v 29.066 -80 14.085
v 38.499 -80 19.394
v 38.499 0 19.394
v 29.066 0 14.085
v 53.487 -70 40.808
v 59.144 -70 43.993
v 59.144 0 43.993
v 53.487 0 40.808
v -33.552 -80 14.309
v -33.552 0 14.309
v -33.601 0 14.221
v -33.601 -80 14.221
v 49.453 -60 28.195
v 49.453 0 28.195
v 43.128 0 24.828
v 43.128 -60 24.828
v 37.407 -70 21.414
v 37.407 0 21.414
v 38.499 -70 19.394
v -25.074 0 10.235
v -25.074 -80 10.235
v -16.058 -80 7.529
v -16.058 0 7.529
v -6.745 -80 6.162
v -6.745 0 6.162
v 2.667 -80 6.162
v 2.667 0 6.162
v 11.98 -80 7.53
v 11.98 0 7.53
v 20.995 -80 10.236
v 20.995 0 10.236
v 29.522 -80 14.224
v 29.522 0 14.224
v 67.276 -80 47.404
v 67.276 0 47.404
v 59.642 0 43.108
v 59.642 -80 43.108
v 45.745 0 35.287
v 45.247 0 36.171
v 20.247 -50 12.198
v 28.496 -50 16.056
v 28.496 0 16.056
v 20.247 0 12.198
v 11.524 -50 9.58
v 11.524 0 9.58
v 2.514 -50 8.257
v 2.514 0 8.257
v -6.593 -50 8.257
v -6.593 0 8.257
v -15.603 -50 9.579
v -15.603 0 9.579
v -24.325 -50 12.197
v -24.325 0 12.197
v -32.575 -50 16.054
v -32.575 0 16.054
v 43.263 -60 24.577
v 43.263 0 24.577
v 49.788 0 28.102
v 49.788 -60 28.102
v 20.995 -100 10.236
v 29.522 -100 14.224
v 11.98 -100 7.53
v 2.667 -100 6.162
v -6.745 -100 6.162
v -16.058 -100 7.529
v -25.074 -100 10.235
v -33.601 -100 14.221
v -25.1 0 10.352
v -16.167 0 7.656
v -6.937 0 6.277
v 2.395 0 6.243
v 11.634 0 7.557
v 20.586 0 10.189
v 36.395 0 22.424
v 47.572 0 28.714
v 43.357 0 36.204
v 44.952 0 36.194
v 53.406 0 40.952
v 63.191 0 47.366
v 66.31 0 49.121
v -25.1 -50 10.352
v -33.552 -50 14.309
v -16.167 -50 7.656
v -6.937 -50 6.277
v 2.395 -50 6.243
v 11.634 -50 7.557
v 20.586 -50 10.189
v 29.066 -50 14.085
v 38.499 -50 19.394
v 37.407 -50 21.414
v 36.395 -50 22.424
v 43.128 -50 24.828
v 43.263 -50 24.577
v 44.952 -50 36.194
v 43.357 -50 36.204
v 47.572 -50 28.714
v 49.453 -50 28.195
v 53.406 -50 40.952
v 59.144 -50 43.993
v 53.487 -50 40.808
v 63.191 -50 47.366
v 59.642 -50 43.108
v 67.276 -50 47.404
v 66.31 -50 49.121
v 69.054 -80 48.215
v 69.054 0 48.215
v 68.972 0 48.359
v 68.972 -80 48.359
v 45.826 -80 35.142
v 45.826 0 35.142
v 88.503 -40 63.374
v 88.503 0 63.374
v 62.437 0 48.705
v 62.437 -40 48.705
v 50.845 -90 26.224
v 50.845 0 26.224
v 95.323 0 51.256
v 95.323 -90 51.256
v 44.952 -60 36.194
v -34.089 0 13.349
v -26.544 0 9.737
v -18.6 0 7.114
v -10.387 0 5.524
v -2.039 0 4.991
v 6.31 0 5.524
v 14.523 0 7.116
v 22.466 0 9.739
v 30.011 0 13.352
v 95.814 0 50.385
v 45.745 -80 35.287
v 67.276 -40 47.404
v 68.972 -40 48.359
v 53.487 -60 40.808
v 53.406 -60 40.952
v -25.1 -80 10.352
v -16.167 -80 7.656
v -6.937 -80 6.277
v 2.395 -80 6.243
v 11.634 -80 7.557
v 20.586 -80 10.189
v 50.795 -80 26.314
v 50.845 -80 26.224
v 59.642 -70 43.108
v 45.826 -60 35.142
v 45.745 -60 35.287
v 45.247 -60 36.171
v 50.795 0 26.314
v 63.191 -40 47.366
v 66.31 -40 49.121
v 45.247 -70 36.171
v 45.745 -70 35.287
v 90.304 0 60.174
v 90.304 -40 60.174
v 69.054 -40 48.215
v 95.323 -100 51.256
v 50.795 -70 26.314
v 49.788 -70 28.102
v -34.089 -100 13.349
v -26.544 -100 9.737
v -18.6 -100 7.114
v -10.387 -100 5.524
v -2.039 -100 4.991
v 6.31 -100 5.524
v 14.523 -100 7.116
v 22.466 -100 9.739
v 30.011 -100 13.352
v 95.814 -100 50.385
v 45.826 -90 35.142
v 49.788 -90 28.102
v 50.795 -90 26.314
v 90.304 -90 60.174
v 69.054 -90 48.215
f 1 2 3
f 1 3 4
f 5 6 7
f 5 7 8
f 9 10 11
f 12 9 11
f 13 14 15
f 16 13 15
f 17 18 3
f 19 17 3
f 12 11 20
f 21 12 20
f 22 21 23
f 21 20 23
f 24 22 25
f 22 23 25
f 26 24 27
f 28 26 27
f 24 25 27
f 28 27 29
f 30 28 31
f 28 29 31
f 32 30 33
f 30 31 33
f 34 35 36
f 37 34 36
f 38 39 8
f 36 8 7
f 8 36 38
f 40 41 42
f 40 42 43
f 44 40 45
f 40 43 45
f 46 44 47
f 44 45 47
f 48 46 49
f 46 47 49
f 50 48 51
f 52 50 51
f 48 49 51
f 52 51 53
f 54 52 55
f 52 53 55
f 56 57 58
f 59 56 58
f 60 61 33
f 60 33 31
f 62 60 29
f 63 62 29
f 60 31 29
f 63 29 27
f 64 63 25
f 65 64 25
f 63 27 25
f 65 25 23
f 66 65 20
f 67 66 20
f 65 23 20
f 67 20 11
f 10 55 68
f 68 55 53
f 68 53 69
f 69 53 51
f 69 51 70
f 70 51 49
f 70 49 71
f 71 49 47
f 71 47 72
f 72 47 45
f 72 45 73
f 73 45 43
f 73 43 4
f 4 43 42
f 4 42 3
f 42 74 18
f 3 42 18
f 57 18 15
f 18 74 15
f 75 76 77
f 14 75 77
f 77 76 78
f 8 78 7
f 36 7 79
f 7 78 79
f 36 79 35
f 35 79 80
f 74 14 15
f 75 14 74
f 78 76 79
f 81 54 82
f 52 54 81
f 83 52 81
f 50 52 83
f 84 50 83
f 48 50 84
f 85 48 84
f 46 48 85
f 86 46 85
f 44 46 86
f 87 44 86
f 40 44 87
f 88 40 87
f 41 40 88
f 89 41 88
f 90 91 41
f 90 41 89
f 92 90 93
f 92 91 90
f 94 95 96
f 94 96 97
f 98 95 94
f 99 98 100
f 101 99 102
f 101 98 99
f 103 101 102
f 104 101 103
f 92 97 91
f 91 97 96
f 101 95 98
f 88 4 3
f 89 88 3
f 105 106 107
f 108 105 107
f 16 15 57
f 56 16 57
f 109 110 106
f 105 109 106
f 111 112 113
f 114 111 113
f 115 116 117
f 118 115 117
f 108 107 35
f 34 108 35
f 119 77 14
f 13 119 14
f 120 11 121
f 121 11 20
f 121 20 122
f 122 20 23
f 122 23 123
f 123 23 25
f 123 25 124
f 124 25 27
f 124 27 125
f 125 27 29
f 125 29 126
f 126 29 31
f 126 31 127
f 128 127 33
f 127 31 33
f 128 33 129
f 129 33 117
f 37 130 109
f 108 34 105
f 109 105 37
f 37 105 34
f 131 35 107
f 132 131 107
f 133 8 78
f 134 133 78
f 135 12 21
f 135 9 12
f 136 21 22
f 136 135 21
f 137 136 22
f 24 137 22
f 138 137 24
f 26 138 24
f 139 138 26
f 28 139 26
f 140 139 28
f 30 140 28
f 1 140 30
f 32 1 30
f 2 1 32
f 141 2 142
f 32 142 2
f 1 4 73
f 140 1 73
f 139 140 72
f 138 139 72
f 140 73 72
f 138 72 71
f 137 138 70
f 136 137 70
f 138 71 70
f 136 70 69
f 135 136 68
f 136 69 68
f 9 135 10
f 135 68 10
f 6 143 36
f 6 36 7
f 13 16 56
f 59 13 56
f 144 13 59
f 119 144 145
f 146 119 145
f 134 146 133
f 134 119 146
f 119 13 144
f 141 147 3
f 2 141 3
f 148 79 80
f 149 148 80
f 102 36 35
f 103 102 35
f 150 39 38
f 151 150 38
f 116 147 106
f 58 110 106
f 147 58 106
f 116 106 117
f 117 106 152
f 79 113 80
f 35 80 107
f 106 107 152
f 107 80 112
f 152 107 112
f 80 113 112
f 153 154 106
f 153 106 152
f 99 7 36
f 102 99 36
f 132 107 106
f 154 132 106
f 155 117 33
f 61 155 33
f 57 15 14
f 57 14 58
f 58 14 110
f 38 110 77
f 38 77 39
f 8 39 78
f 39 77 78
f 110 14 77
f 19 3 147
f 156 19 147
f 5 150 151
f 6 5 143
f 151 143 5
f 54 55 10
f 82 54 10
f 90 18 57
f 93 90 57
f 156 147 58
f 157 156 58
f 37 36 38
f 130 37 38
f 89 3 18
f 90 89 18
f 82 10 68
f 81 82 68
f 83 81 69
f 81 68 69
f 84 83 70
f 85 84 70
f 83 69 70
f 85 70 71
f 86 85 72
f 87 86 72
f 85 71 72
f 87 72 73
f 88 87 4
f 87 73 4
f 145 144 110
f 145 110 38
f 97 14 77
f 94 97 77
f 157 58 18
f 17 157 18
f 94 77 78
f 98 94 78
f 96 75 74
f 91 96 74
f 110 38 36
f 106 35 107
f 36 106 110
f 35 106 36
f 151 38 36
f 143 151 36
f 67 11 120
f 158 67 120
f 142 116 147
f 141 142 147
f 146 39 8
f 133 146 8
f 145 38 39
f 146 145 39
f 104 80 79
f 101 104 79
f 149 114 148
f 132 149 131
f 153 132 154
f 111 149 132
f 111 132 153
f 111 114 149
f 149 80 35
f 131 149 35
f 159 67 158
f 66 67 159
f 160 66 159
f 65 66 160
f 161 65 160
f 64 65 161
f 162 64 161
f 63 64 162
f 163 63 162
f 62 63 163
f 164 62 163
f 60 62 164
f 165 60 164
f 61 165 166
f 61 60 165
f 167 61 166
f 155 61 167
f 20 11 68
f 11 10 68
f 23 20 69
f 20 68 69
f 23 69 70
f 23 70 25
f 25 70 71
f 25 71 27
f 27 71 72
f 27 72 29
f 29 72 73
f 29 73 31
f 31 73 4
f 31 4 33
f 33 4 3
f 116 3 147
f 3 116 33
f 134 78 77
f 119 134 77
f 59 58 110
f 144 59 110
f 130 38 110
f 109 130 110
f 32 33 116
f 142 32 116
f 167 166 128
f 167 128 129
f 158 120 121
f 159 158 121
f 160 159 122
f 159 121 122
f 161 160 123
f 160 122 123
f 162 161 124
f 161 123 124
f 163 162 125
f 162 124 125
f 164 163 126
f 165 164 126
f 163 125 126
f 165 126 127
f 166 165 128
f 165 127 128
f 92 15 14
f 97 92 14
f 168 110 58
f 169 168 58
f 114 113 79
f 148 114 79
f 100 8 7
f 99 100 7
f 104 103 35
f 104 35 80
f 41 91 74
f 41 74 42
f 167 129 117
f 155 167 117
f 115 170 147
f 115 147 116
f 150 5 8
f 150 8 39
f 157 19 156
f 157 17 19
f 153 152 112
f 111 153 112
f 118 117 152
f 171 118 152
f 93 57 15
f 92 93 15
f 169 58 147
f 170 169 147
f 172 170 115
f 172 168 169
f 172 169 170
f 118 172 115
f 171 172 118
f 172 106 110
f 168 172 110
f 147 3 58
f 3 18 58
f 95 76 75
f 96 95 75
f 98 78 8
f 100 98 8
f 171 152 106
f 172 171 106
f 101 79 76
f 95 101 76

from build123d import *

# Parameters (mm, degrees)
F1_DEPTH = 100
F2_DEPTH = 90
F3_DEPTH = 80
F4_DEPTH = 80
F5_DEPTH = 70
F6_DEPTH = 60
F7_DEPTH = 50
F8_DEPTH = 40


with BuildPart() as f1:
    # F0 (on Front) → F1 (new body)
    with BuildSketch(Plane.XZ):
        with BuildLine():
            Line((50.8452397293, 26.2241268437), (29.5219979318, 14.223603626))
            ThreePointArc((29.5219979318, 14.223603626), (-2.0391196005, 5.9907088835), (-33.6008071966, 14.221417955))
            Line((-33.6008071966, 14.221417955), (-34.0891893351, 13.3487880868))
            ThreePointArc((-34.0891893351, 13.3487880868), (-2.0385061949, 4.9907089067), (30.0114505771, 13.3515729915))
            Line((30.0114505771, 13.3515729915), (95.813926037, 50.3845974272))
            Line((95.813926037, 50.3845974272), (95.3234723322, 51.2560646748))
            Line((95.3234723322, 51.2560646748), (50.8452397293, 26.2241268437))
        make_face()
    extrude(amount=F1_DEPTH)


with BuildPart() as f2:
    # F0 (on Front) → F2 (new body)
    with BuildSketch(Plane.XZ):
        Polygon((50.7948435843, 26.3136737049), (50.8452397293, 26.2241268437), (95.3234723322, 51.2560646748), (90.3044164077, 60.1742210862), (69.0536898036, 48.2145087485), (45.8261838048, 35.1422832552), (49.7882909537, 28.1021761505), align=None)
    extrude(amount=F2_DEPTH)


with BuildPart() as f3:
    # F0 (on Front) → F3 (new body)
    with BuildSketch(Plane.XZ):
        with BuildLine():
            ThreePointArc((-33.6008071966, 14.221417955), (-2.0391196005, 5.9907088835), (29.5219979318, 14.223603626))
            Line((29.5219979318, 14.223603626), (50.8452397293, 26.2241268437))
            Line((50.8452397293, 26.2241268437), (50.7948435843, 26.3136737049))
            Line((50.7948435843, 26.3136737049), (38.4987711206, 19.393557876))
            Line((38.4987711206, 19.393557876), (29.0659948309, 14.0848786448))
            ThreePointArc((29.0659948309, 14.0848786448), (-2.2719574378, 6.0911209367), (-33.5519689827, 14.3086809418))
            Line((-33.5519689827, 14.3086809418), (-33.6008071966, 14.221417955))
        make_face()
    extrude(amount=F3_DEPTH)


with BuildPart() as f4:
    # F0 (on Front) → F4 (new body)
    with BuildSketch(Plane.XZ):
        Polygon((45.8261838048, 35.1422832552), (69.0536898036, 48.2145087485), (68.9724342199, 48.3588884915), (67.2759677307, 47.4041328458), (59.6421667017, 43.1079002486), (45.7449282211, 35.2866629982), align=None)
    extrude(amount=F4_DEPTH)


with BuildPart() as f5:
    # F0 (on Front) → F5 (new body)
    with BuildSketch(Plane.XZ):
        Polygon((38.4987711206, 19.393557876), (50.7948435843, 26.3136737049), (49.7882909537, 28.1021761505), (43.2631740892, 24.5774321962), (37.4072678387, 21.4141830802), align=None)
    extrude(amount=F5_DEPTH)


with BuildPart() as f5b:
    # F0 (on Front) → F5, piece 2 (new body)
    with BuildSketch(Plane.XZ):
        Polygon((45.2470448009, 36.1713318051), (45.7449282211, 35.2866629982), (59.6421667017, 43.1079002486), (59.1442832815, 43.9925690556), (53.4865097086, 40.8084264301), align=None)
    extrude(amount=F5_DEPTH)


with BuildPart() as f6:
    # F0 (on Front) → F6 (new body)
    with BuildSketch(Plane.XZ):
        Polygon((43.2631740892, 24.5774321962), (49.7882909537, 28.1021761505), (45.8261838048, 35.1422832552), (45.7449282211, 35.2866629982), (45.2470448009, 36.1713318051), (53.4865097086, 40.8084264301), (53.4059276803, 40.95160936), (44.9516252368, 36.1936061575), (49.453318119, 28.1947311014), (43.1277044117, 24.8282179236), align=None)
    extrude(amount=F6_DEPTH)


with BuildPart() as f7:
    # F0 (on Front) → F7 (new body)
    with BuildSketch(Plane.XZ):
        with BuildLine():
            Line((-32.5752047057, 16.0539406781), (-33.5519689827, 14.3086809418))
            ThreePointArc((-33.5519689827, 14.3086809418), (-2.2719574378, 6.0911209367), (29.0659948309, 14.0848786448))
            Line((29.0659948309, 14.0848786448), (38.4987711206, 19.393557876))
            Line((38.4987711206, 19.393557876), (37.4072678387, 21.4141830802))
            Line((37.4072678387, 21.4141830802), (43.2631740892, 24.5774321962))
            Line((43.2631740892, 24.5774321962), (43.1277044117, 24.8282179236))
            Line((43.1277044117, 24.8282179236), (49.453318119, 28.1947311014))
            Line((49.453318119, 28.1947311014), (44.9516252368, 36.1936061575))
            Line((44.9516252368, 36.1936061575), (53.4059276803, 40.95160936))
            Line((53.4059276803, 40.95160936), (53.4865097086, 40.8084264301))
            Line((53.4865097086, 40.8084264301), (59.1442832815, 43.9925690556))
            Line((59.1442832815, 43.9925690556), (59.6421667017, 43.1079002486))
            Line((59.6421667017, 43.1079002486), (67.2759677307, 47.4041328458))
            Line((67.2759677307, 47.4041328458), (66.3095066613, 49.1213982263))
            Line((66.3095066613, 49.1213982263), (63.190689116, 47.3661565647))
            Line((63.190689116, 47.3661565647), (43.3571876206, 36.2040454072))
            Line((43.3571876206, 36.2040454072), (47.5722491088, 28.7144740215))
            Line((47.5722491088, 28.7144740215), (36.3952242818, 22.4241478499))
            Line((36.3952242818, 22.4241478499), (28.4962685386, 16.0560553203))
            ThreePointArc((28.4962685386, 16.0560553203), (-2.0391923145, 8.0907088823), (-32.5752047057, 16.0539406781))
        make_face()
    extrude(amount=F7_DEPTH)


with BuildPart() as f8:
    # F0 (on Front) → F8 (new body)
    with BuildSketch(Plane.XZ):
        Polygon((69.0536898036, 48.2145087485), (90.3044164077, 60.1742210862), (88.5034794178, 63.3742328025), (62.4374687791, 48.7045231575), (63.190689116, 47.3661565647), (66.3095066613, 49.1213982263), (67.2759677307, 47.4041328458), (68.9724342199, 48.3588884915), align=None)
    extrude(amount=F8_DEPTH)


solid = Compound([f1.part, f2.part, f3.part, f4.part, f5.part, f5b.part, f6.part, f7.part, f8.part])
